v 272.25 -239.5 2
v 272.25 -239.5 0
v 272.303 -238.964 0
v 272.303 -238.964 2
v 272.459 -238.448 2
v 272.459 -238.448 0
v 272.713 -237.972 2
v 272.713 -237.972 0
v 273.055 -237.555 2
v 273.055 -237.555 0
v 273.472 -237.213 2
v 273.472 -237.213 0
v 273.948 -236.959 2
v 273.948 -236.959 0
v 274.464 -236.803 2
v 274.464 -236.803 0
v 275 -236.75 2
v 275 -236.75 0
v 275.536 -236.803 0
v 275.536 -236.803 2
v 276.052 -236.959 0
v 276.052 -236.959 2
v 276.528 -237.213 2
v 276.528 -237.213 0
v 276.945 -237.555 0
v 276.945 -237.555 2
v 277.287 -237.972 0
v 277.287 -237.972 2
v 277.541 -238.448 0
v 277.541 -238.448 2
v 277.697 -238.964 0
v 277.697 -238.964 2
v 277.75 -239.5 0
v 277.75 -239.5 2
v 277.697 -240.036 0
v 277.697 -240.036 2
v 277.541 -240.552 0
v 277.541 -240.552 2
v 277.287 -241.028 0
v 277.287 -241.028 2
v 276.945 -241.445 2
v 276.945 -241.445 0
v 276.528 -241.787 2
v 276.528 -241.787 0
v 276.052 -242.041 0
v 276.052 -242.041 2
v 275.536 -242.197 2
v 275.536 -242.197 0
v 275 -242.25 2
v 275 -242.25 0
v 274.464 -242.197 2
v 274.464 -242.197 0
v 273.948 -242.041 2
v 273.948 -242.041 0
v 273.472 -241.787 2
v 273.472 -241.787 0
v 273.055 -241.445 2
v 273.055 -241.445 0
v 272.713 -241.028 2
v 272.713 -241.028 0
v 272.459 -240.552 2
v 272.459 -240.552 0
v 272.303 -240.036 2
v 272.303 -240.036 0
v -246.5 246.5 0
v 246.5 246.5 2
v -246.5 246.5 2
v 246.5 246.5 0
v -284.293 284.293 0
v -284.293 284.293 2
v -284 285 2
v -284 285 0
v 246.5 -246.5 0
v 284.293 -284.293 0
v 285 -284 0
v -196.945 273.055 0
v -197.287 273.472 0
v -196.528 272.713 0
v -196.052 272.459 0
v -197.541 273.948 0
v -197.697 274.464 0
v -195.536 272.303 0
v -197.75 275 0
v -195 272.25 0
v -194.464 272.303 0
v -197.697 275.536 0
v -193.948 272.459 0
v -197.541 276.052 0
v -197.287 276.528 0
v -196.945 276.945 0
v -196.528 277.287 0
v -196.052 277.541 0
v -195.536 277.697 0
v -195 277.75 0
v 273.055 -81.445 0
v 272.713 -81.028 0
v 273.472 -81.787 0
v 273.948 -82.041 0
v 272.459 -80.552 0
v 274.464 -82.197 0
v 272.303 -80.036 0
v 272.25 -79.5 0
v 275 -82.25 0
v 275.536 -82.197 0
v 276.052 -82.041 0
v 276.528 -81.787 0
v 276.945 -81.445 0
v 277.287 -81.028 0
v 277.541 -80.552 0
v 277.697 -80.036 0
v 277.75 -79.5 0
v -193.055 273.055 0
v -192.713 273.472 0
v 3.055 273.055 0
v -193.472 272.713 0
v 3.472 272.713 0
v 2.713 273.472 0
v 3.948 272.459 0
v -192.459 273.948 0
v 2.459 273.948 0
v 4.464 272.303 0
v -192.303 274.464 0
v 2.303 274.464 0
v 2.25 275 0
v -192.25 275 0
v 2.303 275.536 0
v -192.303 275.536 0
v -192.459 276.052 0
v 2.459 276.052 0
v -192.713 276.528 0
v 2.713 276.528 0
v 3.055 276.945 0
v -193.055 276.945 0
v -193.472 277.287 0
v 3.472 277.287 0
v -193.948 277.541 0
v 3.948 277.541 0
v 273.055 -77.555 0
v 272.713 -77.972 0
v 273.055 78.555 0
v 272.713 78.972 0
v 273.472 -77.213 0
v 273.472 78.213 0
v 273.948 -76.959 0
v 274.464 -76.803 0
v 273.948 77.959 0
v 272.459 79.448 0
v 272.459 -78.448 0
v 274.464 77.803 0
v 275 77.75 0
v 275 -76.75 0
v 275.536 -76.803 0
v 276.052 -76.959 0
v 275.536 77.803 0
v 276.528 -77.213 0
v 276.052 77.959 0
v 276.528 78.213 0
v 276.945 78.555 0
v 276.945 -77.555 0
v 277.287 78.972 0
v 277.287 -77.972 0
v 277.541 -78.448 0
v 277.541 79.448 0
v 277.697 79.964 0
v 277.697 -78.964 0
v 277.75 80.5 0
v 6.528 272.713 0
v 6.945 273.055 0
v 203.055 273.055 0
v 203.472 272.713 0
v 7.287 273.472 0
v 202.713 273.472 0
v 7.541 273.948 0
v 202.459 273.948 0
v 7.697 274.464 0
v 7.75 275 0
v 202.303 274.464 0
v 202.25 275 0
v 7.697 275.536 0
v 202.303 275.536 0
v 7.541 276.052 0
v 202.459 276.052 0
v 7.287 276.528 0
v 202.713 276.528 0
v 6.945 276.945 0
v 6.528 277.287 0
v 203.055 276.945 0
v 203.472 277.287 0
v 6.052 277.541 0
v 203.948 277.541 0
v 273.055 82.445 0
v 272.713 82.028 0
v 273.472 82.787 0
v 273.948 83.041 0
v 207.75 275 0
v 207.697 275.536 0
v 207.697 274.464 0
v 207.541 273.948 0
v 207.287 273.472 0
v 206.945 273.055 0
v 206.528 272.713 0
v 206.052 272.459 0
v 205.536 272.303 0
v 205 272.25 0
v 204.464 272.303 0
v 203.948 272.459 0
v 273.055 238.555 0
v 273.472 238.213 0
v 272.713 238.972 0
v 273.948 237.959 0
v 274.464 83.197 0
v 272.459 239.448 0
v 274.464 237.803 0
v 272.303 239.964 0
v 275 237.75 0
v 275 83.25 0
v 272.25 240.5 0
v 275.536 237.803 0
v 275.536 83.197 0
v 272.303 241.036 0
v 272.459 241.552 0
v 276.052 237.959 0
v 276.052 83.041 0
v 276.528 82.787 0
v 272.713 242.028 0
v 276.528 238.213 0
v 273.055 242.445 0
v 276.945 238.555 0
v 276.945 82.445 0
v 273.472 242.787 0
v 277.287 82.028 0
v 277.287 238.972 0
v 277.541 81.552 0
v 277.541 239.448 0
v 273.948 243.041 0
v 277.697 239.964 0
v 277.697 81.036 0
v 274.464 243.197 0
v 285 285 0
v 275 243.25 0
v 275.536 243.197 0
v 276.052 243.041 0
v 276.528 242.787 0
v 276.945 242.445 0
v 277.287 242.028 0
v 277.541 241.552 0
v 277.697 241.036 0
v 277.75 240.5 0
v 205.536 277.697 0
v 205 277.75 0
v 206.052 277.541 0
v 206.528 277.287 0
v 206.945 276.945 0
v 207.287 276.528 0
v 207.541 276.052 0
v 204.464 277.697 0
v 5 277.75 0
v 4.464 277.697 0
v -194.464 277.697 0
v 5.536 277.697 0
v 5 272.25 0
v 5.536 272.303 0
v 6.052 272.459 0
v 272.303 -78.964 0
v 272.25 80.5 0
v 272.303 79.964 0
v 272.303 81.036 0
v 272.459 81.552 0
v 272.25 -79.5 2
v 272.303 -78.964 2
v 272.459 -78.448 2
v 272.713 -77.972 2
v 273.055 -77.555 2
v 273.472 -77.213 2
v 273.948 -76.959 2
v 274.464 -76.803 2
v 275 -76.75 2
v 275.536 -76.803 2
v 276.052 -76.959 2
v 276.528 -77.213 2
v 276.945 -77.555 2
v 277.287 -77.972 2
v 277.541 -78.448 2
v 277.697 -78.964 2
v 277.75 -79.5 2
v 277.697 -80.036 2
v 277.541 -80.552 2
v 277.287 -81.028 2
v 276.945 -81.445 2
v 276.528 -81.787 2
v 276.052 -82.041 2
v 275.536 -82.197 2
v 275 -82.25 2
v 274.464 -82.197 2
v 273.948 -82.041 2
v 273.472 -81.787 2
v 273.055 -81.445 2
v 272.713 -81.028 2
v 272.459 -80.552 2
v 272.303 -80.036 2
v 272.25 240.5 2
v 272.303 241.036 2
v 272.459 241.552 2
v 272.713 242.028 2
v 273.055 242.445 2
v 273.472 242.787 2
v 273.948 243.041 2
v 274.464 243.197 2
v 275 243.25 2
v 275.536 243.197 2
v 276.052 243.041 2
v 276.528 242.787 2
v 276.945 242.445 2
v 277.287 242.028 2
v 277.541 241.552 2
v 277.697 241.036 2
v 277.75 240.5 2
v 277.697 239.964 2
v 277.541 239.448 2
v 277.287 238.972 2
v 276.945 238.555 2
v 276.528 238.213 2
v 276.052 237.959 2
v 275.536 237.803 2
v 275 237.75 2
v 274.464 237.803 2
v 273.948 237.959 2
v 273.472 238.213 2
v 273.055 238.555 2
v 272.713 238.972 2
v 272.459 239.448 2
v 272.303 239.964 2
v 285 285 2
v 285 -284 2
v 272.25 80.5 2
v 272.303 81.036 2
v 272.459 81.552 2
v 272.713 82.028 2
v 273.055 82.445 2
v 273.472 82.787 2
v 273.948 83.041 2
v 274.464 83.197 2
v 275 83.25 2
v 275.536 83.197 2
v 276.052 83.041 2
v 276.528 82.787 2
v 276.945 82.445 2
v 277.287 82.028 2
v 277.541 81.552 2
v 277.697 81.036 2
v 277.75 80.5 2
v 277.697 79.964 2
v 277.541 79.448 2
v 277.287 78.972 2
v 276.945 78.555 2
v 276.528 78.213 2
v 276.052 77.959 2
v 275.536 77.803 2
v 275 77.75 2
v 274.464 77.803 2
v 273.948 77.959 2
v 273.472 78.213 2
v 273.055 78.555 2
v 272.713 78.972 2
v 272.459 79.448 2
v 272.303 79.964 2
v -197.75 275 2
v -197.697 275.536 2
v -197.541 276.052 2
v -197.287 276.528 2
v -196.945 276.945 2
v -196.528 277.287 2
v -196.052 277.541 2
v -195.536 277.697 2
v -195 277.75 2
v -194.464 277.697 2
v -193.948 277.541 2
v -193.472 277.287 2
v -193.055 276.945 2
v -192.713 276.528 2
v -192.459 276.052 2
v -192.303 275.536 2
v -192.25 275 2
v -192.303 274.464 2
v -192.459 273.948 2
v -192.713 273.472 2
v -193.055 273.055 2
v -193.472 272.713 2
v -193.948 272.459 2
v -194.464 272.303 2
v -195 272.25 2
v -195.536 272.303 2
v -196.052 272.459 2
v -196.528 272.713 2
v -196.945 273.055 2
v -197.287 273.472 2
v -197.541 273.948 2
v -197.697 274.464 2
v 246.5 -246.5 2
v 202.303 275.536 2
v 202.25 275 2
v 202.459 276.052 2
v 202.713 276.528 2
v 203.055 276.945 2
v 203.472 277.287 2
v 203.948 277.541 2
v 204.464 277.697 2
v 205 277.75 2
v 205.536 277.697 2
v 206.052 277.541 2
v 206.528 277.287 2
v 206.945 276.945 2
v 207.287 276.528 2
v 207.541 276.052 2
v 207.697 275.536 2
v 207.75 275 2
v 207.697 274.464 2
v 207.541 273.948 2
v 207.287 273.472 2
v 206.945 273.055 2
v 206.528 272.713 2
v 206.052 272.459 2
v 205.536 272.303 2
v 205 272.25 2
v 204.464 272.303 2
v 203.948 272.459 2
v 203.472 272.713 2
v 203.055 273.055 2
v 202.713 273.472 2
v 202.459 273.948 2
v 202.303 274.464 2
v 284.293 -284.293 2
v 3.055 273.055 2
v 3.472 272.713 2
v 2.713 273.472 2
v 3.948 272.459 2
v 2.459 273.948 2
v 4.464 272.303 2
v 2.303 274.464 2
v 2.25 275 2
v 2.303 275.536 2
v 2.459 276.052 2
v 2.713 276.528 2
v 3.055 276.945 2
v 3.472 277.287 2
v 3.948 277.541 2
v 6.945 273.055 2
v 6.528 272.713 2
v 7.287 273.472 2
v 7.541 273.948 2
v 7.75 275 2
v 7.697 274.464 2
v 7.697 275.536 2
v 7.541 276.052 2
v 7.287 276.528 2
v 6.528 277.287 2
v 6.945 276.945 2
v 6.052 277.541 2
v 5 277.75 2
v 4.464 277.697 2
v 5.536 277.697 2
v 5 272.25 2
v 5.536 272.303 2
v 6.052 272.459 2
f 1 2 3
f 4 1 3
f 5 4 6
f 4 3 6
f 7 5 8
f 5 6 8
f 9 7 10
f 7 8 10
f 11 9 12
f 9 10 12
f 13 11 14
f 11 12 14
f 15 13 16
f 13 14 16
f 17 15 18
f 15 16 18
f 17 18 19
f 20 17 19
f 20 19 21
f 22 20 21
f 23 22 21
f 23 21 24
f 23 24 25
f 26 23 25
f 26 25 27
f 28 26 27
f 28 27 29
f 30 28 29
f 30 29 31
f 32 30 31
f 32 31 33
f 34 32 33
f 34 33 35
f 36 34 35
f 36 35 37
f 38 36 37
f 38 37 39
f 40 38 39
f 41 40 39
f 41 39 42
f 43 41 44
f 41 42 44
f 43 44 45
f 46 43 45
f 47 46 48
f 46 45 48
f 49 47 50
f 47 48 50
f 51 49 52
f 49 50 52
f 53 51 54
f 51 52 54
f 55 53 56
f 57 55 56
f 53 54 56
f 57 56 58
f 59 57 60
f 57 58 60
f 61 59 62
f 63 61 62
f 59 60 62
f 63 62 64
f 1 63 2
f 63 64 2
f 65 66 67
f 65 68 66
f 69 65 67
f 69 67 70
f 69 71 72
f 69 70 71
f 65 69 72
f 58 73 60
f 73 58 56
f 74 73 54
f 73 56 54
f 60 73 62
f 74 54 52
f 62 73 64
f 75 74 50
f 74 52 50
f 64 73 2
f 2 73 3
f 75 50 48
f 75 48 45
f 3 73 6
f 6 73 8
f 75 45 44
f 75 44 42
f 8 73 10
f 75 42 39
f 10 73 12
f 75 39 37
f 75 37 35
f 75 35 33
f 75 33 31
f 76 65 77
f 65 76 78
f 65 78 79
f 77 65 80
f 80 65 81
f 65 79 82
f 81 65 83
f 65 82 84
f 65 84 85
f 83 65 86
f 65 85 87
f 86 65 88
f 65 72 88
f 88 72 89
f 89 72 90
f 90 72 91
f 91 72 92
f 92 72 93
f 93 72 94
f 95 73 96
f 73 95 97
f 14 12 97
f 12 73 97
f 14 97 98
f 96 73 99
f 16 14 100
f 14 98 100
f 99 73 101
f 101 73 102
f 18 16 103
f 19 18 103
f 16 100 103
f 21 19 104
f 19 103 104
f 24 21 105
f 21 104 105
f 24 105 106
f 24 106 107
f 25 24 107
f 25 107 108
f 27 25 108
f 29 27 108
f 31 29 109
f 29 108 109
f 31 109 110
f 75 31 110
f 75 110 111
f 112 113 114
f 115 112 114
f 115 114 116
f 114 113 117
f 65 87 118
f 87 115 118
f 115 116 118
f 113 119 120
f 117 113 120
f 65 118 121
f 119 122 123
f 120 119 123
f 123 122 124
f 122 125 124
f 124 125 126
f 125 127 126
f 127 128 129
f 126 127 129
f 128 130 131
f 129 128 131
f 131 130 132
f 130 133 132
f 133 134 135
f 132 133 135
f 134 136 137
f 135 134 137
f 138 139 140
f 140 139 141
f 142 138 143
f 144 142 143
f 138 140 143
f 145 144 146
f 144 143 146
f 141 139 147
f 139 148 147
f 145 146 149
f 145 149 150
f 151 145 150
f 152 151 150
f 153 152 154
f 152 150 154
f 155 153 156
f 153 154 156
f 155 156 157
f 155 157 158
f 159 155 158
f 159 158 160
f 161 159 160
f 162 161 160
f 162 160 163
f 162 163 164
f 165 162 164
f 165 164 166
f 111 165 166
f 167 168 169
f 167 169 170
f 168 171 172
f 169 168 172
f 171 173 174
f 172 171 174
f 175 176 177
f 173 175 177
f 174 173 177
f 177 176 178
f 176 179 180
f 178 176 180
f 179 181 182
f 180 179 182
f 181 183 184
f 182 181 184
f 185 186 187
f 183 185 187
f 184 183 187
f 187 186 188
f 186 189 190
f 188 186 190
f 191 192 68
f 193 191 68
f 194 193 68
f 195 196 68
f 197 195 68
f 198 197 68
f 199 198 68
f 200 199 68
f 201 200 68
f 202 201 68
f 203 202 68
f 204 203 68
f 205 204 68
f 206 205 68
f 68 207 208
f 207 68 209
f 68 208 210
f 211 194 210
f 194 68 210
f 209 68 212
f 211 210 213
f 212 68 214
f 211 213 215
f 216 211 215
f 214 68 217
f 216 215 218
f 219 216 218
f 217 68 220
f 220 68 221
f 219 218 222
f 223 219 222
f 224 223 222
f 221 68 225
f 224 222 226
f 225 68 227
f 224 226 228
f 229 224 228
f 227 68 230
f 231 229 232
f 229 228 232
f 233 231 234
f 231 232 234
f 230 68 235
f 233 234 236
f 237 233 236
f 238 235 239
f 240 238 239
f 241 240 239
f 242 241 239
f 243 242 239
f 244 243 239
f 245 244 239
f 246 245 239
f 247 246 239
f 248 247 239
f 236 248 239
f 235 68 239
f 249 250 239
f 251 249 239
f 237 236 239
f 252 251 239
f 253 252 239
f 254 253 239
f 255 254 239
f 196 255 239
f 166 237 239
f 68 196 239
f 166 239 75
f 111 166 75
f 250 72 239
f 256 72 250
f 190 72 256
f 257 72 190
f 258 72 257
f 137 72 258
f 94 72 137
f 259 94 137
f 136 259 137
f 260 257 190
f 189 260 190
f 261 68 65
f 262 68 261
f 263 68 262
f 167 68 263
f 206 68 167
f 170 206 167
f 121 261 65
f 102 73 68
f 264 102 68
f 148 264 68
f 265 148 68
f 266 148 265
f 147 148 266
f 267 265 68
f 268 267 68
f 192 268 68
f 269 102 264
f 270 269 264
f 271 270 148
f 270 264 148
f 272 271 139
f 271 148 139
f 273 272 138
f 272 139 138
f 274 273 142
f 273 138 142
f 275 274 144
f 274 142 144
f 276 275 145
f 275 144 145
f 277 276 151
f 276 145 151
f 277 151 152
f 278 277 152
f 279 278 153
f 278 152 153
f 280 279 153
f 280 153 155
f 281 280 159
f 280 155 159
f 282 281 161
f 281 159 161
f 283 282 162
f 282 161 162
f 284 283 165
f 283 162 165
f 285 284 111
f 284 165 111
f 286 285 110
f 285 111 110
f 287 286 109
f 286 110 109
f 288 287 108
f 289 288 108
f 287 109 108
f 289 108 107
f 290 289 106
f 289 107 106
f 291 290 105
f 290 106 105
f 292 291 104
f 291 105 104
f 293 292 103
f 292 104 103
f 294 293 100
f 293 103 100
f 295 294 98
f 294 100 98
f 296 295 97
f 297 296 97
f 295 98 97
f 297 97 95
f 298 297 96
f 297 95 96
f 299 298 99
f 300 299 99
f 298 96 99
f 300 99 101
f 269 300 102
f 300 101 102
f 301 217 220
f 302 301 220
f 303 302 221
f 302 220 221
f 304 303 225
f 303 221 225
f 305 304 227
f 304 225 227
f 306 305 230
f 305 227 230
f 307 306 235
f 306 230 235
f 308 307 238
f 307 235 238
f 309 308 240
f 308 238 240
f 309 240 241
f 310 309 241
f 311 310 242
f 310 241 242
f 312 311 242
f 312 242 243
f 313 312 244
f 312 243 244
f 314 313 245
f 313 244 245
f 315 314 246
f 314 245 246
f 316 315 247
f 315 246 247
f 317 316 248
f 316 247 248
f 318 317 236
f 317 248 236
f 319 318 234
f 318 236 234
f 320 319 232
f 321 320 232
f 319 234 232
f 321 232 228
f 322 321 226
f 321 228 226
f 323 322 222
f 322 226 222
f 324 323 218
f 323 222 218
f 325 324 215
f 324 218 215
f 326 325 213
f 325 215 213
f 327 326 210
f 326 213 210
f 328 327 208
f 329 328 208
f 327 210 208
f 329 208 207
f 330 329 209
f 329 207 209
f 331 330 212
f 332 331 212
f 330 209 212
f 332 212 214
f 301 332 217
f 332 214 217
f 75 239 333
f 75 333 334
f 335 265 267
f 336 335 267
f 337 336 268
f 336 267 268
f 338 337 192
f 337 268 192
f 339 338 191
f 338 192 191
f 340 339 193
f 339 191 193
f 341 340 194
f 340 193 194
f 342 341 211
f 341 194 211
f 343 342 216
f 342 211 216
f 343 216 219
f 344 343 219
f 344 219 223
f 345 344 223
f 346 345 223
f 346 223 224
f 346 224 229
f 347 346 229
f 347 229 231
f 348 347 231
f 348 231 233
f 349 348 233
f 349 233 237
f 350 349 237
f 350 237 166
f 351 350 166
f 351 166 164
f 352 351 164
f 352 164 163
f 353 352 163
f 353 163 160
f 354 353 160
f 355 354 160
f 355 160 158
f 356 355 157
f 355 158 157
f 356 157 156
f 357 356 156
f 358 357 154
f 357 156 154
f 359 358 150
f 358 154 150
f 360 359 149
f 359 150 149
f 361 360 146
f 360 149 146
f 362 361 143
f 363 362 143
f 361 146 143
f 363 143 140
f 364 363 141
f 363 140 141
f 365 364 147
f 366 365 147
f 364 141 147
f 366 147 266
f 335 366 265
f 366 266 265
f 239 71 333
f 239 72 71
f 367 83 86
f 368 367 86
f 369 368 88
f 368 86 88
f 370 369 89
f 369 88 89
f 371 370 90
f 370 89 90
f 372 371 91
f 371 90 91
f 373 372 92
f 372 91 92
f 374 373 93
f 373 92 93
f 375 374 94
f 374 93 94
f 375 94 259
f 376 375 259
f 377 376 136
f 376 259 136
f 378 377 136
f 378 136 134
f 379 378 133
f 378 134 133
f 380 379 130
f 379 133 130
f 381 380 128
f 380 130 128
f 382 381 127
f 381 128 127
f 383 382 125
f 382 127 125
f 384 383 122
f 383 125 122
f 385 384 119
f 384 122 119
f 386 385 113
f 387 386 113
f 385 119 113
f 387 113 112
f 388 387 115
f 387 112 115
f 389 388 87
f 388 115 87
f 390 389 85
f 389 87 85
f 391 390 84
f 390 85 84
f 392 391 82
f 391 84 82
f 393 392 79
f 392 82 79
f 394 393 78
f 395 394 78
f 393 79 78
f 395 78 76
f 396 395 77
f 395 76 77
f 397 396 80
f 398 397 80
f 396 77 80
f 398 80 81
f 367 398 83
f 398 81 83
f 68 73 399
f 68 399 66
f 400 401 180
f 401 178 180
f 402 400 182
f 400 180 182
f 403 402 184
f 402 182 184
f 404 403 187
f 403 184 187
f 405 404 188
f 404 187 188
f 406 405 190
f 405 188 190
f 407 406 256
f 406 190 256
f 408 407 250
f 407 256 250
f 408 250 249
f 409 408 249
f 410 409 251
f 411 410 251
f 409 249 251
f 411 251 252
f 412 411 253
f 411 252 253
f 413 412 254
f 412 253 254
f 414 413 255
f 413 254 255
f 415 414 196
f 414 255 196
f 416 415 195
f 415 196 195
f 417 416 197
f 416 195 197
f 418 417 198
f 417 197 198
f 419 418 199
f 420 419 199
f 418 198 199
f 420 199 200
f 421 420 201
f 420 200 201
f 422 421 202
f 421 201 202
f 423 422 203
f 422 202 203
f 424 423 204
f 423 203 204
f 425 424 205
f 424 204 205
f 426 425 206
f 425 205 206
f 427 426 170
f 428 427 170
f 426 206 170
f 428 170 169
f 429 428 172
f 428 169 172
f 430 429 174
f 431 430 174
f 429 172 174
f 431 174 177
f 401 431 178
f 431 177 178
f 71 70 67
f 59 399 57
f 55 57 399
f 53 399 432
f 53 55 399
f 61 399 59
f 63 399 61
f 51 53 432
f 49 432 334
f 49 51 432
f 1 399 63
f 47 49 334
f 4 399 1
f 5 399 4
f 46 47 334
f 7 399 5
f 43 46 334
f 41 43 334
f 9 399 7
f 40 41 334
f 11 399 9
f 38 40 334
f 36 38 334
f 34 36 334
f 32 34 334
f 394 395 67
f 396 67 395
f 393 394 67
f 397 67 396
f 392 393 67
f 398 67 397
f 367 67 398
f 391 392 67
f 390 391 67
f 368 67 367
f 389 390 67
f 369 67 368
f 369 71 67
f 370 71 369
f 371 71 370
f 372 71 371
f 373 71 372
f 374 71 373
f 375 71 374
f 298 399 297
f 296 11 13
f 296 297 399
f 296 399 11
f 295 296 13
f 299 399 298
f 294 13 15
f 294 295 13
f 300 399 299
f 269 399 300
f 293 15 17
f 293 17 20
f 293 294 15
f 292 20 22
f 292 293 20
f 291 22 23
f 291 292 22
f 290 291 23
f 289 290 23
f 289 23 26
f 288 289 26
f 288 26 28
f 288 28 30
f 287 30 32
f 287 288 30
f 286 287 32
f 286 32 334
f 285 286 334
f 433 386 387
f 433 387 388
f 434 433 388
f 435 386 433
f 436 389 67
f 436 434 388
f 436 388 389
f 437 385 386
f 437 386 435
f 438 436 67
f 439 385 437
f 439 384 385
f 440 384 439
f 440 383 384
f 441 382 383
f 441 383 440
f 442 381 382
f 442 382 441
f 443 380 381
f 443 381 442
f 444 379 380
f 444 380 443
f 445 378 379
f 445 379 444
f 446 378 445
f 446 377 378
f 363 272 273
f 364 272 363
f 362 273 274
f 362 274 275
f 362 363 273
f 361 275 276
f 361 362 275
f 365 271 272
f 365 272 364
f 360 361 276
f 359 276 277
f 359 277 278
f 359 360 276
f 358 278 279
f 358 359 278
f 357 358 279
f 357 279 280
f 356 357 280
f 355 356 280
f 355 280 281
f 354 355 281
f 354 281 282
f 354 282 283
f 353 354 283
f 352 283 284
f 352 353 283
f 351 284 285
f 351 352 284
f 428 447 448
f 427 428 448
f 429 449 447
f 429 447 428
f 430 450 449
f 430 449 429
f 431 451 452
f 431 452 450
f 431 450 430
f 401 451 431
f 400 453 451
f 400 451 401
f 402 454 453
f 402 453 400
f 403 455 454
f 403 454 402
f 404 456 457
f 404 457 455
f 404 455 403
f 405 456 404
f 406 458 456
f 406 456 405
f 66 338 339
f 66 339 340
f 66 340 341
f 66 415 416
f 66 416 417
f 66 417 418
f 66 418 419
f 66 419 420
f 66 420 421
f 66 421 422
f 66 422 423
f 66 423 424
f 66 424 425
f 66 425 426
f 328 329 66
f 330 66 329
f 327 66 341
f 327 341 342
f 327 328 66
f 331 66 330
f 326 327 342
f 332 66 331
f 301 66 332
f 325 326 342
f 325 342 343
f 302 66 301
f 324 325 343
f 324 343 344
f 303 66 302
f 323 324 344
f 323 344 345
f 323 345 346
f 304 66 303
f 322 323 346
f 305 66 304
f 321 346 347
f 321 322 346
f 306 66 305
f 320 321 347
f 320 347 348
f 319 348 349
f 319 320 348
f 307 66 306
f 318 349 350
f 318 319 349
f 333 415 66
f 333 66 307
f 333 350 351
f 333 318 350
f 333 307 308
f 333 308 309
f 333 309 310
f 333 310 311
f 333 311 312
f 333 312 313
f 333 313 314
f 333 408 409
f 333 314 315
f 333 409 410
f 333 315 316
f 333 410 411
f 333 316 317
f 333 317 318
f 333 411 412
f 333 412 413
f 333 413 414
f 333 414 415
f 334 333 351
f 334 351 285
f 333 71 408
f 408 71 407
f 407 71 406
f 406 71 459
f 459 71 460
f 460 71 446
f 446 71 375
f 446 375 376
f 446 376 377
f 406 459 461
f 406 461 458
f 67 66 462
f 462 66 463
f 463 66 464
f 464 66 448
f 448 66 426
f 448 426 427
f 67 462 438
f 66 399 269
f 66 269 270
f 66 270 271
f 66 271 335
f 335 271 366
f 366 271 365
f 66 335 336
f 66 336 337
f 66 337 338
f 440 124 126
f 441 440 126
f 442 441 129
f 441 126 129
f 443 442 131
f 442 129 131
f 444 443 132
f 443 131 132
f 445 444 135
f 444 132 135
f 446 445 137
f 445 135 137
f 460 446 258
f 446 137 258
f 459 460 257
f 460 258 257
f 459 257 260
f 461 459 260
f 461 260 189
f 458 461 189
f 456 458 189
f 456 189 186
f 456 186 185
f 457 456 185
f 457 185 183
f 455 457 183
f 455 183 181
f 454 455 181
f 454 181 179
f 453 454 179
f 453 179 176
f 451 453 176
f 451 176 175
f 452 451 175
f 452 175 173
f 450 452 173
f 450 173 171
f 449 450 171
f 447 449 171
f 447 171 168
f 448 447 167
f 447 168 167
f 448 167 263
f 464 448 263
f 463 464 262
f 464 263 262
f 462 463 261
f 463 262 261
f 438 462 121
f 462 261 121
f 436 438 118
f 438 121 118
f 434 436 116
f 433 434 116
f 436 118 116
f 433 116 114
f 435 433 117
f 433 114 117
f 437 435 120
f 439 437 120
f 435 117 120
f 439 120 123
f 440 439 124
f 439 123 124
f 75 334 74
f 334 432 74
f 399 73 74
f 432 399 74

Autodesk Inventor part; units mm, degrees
ref_plane "YZ Plane" through (0, 0, 0) normal (1, 0, 0) x (0, 1, 0)
ref_plane "XZ Plane" through (0, 0, 0) normal (0, 1, 0) x (-1, 0, 0)
ref_plane "XY Plane" through (0, 0, 0) normal (0, 0, 1) x (1, 0, 0)
sketch "Sketch1" plane through (0, 0, 0) normal (0, 0, 1) x (1, 0, 0)
  line L0 (-285, 285) -> (285, 285)
  line L1 (285, 285) -> (285, -285)
  line L2 (285, -285) -> (-285, -285)
  line L3 (-285, -285) -> (-285, 285)
  line L4 (-285, 285) -> (285, -285) construction
  line L5 (285, 285) -> (-285, -285) construction
  line L6 (-246.5, -246.5) -> (246.5, -246.5)
  line L7 (246.5, -246.5) -> (246.5, 246.5)
  line L8 (246.5, 246.5) -> (-246.5, 246.5)
  line L9 (-246.5, 246.5) -> (-246.5, -246.5)
  line L10 (-246.5, -246.5) -> (246.5, 246.5) construction
  line L11 (246.5, -246.5) -> (-246.5, 246.5) construction
  line L12 (-246.5, 246.5) -> (-285, 285)
  line L13 (246.5, -246.5) -> (285, -285)
  point P0 (0, 0)
  dimension "d1" = 570
  dimension "d2" = 493
extrude "Plate1" add sketch "Sketch1" along normal blind 2 contours L0 L1 L13 L7 L8 L12
chamfer "Corner Chamfer1" distance 1 angle 45 2 edges at (-285, 285, 1) (285, -285, 1)
sketch "Sketch2" plane through (0, 0, 0) normal (0, 0, -1) x (-1, 0, 0)
  line L0 (-284.2929, -284.2929) -> (-285, -284) projected
  line L1 (-246.5, -246.5) -> (-284.2929, -284.2929) projected
  line L2 (-246.5, 246.5) -> (-246.5, -246.5) construction
  line L3 (246.5, 246.5) -> (-246.5, 246.5) construction
  line L4 (284.2929, 284.2929) -> (246.5, 246.5) projected
  line L5 (284, 285) -> (284.2929, 284.2929) projected
  line L6 (-285, 285) -> (284, 285) construction
  line L7 (-285, -284) -> (-285, 285) construction
  circle A0 centre (-275, 240.5) radius 2.75
  circle A1 centre (-275, 80.5) radius 2.75
  circle A2 centre (-275, -79.5) radius 2.75
  circle A3 centre (-275, -239.5) radius 2.75
  line L8 (-275, 285) -> (-275, -275) construction
  line L9 (-285, 275) -> (275, 275) construction
  line L10 (-285, -284) -> (-285, 285) construction
  circle A4 centre (-205, 275) radius 2.75
  circle A5 centre (-5, 275) radius 2.75
  circle A6 centre (195, 275) radius 2.75
  point P0 (0, 0)
  point P1 (-285, 0.5)
  point P2 (-285, 0.5)
  point P3 (-285, 0.5)
  point P4 (-285, 0.5)
  dimension "d7" = 5.5
  dimension "d8" = 10
  dimension "d9" = 10
  dimension "d10" = 80
  dimension "d11" = 80
  dimension "d12" = 240
  dimension "d13" = 240
  dimension "d14" = 200
  dimension "d15" = 200
extrude "Cut1" cut sketch "Sketch2" against normal blind 2
equation "\"d9\" = d8"
equation "\"d11\" = d10"
equation "\"d13\" = d12"
equation "\"d15\" = d14"
equation "\"d16\" = Thickness"
equation "\"d3\" = Thickness"
equation "\"BendRadius\" = Thickness"
equation "\"BendReliefWidth\" = Thickness"
equation "\"BendReliefDepth\" = 0.5 * Thickness"
equation "\"CornerReliefSize\" = 4 * Thickness"
equation "\"MinimumRemnant\" = 2 * Thickness"
equation "\"TransitionRadius\" = BendRadius"
equation "\"JacobiRadiusSize\" = BendRadius"
equation "\"GapSize\" = Thickness"
equation "\"Thickness\" = 2"
properties part number "PNS waste water bin 01"
